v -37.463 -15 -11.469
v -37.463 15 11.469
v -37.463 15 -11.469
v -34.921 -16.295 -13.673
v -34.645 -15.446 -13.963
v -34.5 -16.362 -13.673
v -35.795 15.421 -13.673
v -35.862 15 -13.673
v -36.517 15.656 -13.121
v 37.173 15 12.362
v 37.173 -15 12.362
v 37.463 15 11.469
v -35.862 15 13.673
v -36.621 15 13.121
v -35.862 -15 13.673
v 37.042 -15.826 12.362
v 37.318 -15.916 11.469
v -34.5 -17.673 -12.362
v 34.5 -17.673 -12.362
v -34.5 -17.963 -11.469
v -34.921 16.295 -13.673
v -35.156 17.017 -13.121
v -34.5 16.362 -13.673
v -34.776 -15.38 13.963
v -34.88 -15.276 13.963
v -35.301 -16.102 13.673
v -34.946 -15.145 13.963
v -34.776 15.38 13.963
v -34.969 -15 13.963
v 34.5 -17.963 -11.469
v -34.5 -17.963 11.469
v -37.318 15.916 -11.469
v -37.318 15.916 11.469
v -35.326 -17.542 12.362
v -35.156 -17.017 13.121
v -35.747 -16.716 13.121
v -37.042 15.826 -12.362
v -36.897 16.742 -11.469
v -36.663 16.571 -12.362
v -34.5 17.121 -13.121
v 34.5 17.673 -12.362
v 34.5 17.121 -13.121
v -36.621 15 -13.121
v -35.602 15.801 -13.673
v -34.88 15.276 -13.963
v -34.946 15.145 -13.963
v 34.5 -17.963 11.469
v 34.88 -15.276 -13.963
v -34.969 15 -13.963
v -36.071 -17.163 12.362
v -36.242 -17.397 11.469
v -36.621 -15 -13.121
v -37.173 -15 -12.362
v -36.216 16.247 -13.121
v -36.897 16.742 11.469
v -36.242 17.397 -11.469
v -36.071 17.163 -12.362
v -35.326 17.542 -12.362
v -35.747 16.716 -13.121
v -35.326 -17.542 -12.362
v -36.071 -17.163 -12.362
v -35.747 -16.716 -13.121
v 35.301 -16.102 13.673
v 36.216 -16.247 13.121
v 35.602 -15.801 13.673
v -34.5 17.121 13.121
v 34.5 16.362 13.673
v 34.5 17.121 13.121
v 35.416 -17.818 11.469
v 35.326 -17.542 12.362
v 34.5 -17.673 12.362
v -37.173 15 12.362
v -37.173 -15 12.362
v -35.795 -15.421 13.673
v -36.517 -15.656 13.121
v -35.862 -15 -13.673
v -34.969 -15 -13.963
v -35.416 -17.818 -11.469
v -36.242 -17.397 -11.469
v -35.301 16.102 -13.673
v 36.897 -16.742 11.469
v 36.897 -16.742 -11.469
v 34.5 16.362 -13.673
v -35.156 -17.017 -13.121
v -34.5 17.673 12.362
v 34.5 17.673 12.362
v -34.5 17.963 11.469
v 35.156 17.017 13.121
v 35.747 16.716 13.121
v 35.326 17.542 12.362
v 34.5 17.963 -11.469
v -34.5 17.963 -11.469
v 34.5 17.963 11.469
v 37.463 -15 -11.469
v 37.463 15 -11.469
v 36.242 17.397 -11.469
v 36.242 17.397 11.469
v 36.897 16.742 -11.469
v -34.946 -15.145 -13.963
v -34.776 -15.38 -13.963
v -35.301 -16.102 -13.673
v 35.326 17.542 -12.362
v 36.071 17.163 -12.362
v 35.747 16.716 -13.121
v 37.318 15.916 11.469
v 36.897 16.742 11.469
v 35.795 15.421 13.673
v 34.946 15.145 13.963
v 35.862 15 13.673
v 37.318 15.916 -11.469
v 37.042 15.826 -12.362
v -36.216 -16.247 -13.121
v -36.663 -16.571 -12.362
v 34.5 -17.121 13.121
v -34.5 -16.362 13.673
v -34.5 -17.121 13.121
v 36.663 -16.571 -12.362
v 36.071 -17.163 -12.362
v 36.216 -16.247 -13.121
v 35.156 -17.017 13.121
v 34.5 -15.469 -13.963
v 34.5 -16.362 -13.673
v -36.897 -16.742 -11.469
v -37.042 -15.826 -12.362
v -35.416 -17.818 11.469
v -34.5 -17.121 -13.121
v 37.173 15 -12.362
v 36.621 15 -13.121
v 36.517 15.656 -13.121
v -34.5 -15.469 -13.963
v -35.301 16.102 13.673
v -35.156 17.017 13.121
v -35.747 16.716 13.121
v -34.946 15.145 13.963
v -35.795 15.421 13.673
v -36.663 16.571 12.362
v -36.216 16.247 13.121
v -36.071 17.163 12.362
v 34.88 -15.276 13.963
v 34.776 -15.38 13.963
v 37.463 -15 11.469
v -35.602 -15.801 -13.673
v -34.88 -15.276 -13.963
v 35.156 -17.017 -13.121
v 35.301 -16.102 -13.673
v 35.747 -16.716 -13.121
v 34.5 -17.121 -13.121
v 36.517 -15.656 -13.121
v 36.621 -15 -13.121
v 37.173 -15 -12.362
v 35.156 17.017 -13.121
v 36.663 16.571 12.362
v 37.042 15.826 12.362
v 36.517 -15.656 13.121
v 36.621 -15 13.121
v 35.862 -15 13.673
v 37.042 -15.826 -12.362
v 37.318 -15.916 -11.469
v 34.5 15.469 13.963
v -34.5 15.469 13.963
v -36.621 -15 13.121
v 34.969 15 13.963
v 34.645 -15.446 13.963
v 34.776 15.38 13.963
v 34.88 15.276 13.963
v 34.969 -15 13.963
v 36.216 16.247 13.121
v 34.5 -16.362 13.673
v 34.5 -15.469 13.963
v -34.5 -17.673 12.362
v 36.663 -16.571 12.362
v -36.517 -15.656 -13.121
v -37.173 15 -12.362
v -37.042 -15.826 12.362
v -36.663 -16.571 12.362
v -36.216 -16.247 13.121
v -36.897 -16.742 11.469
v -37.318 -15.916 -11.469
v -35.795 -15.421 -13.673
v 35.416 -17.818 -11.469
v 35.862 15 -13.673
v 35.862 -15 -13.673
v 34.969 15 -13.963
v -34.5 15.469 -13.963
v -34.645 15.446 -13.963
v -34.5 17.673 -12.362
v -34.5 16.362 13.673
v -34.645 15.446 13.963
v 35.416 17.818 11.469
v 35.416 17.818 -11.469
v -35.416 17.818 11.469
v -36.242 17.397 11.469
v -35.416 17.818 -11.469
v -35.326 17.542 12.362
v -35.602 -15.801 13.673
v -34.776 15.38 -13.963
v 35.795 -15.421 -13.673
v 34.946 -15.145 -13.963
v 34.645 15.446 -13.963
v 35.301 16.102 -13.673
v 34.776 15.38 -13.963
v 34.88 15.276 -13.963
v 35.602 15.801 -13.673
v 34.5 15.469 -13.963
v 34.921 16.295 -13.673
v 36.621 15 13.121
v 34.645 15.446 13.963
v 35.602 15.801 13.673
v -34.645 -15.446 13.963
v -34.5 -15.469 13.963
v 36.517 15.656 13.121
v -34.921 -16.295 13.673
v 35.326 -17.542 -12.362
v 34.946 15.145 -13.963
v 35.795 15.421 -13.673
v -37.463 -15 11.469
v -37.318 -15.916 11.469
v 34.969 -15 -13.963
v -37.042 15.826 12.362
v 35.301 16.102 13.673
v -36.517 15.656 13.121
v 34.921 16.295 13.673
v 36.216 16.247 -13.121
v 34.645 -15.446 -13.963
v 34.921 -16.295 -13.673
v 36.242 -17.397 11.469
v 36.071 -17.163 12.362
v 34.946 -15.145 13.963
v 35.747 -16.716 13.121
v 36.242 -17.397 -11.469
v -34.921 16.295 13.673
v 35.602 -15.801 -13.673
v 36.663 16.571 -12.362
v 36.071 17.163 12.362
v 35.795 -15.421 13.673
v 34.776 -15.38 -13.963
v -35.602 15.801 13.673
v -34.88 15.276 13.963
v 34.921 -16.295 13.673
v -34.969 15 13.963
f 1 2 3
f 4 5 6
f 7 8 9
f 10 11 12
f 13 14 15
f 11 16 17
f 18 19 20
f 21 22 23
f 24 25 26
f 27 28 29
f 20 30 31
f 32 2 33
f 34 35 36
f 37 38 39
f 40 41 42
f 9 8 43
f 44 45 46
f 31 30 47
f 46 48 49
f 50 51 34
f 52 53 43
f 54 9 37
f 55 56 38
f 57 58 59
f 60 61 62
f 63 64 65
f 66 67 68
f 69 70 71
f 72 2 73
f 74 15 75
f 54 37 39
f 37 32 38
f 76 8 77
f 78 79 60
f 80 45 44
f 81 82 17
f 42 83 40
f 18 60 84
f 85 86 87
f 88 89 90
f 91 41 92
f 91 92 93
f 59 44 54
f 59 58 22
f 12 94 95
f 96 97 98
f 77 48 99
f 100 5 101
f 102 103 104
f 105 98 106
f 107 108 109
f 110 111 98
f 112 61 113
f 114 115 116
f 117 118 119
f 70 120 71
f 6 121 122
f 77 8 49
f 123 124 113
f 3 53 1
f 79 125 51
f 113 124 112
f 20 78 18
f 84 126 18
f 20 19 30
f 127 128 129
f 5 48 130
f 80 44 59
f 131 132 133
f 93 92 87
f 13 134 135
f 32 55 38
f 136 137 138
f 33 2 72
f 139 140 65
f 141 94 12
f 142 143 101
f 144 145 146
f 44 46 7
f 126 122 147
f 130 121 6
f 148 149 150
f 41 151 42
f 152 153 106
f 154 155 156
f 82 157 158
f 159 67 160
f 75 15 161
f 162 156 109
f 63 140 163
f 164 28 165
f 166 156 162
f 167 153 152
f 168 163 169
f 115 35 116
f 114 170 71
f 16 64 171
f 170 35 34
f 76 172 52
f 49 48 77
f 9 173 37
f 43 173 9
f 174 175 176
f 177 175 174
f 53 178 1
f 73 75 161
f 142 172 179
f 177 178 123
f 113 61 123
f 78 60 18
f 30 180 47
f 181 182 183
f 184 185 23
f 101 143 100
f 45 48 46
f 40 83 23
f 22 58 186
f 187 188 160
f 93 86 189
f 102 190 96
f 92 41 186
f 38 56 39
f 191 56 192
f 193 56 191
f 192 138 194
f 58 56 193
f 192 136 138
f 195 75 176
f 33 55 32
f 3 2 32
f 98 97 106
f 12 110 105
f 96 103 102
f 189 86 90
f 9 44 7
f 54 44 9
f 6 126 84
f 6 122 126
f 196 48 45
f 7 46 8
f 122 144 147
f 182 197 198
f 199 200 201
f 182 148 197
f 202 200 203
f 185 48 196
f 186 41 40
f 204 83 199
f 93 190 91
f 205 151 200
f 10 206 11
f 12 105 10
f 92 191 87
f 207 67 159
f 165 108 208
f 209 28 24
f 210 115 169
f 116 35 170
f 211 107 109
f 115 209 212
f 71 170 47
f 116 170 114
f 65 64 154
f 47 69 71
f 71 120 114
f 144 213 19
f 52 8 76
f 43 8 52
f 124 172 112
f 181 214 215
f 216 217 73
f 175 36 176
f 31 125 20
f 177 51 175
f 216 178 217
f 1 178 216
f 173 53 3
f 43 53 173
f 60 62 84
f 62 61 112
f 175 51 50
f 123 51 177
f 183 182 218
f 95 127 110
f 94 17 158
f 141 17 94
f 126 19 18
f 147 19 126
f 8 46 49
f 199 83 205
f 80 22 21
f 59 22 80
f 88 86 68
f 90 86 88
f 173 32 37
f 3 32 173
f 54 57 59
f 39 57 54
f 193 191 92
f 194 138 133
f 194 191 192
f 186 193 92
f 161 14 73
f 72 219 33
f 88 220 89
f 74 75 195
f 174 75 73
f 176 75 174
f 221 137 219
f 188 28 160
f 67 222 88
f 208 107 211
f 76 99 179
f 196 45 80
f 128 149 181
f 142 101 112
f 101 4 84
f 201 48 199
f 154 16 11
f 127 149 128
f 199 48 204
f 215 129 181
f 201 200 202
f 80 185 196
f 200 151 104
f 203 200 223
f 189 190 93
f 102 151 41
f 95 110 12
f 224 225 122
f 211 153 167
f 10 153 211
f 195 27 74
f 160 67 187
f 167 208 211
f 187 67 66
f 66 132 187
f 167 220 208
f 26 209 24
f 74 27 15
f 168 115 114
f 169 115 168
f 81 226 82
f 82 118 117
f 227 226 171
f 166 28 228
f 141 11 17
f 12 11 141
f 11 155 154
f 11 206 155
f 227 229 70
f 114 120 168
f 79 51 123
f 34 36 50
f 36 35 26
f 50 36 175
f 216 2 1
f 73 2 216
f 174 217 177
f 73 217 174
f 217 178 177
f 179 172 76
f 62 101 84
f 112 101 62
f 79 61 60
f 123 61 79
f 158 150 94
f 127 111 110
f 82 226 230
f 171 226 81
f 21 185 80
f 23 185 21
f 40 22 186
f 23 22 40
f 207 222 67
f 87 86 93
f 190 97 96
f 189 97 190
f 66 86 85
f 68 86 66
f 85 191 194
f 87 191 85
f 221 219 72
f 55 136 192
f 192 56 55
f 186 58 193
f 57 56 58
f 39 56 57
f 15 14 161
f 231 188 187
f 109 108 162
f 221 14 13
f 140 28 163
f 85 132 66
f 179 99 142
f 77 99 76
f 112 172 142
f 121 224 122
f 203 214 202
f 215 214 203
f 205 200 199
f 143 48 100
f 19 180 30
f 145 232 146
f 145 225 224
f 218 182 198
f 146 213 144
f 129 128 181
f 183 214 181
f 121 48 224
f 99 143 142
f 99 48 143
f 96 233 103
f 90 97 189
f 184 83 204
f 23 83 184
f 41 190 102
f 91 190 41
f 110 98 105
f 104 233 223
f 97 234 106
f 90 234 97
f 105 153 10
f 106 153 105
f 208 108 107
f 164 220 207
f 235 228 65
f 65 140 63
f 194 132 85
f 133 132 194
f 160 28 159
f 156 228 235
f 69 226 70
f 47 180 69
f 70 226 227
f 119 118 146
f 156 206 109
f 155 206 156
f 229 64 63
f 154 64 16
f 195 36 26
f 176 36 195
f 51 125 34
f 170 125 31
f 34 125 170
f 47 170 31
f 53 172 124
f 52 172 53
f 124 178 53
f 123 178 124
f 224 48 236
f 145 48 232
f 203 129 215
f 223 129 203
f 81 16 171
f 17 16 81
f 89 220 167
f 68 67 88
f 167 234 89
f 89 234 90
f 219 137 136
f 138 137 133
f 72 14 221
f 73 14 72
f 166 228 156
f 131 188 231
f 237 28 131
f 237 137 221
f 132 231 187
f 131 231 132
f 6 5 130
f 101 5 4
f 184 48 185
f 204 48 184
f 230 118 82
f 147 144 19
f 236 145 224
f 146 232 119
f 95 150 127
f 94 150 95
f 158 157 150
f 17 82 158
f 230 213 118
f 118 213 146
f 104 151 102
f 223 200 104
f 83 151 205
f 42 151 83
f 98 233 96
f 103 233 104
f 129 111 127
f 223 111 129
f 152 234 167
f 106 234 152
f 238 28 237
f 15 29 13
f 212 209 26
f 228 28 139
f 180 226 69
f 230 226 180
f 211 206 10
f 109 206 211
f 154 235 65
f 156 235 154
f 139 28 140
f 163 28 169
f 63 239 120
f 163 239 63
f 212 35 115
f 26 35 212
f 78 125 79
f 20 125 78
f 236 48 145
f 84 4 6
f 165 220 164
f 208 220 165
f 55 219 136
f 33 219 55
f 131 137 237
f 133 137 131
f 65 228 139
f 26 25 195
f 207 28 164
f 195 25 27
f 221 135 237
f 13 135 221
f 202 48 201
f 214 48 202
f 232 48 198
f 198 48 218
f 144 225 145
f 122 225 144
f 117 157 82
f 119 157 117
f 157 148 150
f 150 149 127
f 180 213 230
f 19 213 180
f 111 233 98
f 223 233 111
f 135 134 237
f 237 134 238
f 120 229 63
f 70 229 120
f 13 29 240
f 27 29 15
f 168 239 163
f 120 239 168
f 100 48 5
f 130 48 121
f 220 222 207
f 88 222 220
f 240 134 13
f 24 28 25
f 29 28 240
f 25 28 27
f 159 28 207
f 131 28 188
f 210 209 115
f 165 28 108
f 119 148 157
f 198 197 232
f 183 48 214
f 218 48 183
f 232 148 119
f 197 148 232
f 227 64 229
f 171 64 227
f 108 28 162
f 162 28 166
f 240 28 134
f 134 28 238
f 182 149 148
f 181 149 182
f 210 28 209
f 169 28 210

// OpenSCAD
$fa = 4;
$fs = 0.8;

module battery_pack() {
  color("#f0c400")
    minkowski() {
      cube([69, 30, 22], center = true);
      sphere(r = 3, $fn = 20);
    }
}

battery_pack();
